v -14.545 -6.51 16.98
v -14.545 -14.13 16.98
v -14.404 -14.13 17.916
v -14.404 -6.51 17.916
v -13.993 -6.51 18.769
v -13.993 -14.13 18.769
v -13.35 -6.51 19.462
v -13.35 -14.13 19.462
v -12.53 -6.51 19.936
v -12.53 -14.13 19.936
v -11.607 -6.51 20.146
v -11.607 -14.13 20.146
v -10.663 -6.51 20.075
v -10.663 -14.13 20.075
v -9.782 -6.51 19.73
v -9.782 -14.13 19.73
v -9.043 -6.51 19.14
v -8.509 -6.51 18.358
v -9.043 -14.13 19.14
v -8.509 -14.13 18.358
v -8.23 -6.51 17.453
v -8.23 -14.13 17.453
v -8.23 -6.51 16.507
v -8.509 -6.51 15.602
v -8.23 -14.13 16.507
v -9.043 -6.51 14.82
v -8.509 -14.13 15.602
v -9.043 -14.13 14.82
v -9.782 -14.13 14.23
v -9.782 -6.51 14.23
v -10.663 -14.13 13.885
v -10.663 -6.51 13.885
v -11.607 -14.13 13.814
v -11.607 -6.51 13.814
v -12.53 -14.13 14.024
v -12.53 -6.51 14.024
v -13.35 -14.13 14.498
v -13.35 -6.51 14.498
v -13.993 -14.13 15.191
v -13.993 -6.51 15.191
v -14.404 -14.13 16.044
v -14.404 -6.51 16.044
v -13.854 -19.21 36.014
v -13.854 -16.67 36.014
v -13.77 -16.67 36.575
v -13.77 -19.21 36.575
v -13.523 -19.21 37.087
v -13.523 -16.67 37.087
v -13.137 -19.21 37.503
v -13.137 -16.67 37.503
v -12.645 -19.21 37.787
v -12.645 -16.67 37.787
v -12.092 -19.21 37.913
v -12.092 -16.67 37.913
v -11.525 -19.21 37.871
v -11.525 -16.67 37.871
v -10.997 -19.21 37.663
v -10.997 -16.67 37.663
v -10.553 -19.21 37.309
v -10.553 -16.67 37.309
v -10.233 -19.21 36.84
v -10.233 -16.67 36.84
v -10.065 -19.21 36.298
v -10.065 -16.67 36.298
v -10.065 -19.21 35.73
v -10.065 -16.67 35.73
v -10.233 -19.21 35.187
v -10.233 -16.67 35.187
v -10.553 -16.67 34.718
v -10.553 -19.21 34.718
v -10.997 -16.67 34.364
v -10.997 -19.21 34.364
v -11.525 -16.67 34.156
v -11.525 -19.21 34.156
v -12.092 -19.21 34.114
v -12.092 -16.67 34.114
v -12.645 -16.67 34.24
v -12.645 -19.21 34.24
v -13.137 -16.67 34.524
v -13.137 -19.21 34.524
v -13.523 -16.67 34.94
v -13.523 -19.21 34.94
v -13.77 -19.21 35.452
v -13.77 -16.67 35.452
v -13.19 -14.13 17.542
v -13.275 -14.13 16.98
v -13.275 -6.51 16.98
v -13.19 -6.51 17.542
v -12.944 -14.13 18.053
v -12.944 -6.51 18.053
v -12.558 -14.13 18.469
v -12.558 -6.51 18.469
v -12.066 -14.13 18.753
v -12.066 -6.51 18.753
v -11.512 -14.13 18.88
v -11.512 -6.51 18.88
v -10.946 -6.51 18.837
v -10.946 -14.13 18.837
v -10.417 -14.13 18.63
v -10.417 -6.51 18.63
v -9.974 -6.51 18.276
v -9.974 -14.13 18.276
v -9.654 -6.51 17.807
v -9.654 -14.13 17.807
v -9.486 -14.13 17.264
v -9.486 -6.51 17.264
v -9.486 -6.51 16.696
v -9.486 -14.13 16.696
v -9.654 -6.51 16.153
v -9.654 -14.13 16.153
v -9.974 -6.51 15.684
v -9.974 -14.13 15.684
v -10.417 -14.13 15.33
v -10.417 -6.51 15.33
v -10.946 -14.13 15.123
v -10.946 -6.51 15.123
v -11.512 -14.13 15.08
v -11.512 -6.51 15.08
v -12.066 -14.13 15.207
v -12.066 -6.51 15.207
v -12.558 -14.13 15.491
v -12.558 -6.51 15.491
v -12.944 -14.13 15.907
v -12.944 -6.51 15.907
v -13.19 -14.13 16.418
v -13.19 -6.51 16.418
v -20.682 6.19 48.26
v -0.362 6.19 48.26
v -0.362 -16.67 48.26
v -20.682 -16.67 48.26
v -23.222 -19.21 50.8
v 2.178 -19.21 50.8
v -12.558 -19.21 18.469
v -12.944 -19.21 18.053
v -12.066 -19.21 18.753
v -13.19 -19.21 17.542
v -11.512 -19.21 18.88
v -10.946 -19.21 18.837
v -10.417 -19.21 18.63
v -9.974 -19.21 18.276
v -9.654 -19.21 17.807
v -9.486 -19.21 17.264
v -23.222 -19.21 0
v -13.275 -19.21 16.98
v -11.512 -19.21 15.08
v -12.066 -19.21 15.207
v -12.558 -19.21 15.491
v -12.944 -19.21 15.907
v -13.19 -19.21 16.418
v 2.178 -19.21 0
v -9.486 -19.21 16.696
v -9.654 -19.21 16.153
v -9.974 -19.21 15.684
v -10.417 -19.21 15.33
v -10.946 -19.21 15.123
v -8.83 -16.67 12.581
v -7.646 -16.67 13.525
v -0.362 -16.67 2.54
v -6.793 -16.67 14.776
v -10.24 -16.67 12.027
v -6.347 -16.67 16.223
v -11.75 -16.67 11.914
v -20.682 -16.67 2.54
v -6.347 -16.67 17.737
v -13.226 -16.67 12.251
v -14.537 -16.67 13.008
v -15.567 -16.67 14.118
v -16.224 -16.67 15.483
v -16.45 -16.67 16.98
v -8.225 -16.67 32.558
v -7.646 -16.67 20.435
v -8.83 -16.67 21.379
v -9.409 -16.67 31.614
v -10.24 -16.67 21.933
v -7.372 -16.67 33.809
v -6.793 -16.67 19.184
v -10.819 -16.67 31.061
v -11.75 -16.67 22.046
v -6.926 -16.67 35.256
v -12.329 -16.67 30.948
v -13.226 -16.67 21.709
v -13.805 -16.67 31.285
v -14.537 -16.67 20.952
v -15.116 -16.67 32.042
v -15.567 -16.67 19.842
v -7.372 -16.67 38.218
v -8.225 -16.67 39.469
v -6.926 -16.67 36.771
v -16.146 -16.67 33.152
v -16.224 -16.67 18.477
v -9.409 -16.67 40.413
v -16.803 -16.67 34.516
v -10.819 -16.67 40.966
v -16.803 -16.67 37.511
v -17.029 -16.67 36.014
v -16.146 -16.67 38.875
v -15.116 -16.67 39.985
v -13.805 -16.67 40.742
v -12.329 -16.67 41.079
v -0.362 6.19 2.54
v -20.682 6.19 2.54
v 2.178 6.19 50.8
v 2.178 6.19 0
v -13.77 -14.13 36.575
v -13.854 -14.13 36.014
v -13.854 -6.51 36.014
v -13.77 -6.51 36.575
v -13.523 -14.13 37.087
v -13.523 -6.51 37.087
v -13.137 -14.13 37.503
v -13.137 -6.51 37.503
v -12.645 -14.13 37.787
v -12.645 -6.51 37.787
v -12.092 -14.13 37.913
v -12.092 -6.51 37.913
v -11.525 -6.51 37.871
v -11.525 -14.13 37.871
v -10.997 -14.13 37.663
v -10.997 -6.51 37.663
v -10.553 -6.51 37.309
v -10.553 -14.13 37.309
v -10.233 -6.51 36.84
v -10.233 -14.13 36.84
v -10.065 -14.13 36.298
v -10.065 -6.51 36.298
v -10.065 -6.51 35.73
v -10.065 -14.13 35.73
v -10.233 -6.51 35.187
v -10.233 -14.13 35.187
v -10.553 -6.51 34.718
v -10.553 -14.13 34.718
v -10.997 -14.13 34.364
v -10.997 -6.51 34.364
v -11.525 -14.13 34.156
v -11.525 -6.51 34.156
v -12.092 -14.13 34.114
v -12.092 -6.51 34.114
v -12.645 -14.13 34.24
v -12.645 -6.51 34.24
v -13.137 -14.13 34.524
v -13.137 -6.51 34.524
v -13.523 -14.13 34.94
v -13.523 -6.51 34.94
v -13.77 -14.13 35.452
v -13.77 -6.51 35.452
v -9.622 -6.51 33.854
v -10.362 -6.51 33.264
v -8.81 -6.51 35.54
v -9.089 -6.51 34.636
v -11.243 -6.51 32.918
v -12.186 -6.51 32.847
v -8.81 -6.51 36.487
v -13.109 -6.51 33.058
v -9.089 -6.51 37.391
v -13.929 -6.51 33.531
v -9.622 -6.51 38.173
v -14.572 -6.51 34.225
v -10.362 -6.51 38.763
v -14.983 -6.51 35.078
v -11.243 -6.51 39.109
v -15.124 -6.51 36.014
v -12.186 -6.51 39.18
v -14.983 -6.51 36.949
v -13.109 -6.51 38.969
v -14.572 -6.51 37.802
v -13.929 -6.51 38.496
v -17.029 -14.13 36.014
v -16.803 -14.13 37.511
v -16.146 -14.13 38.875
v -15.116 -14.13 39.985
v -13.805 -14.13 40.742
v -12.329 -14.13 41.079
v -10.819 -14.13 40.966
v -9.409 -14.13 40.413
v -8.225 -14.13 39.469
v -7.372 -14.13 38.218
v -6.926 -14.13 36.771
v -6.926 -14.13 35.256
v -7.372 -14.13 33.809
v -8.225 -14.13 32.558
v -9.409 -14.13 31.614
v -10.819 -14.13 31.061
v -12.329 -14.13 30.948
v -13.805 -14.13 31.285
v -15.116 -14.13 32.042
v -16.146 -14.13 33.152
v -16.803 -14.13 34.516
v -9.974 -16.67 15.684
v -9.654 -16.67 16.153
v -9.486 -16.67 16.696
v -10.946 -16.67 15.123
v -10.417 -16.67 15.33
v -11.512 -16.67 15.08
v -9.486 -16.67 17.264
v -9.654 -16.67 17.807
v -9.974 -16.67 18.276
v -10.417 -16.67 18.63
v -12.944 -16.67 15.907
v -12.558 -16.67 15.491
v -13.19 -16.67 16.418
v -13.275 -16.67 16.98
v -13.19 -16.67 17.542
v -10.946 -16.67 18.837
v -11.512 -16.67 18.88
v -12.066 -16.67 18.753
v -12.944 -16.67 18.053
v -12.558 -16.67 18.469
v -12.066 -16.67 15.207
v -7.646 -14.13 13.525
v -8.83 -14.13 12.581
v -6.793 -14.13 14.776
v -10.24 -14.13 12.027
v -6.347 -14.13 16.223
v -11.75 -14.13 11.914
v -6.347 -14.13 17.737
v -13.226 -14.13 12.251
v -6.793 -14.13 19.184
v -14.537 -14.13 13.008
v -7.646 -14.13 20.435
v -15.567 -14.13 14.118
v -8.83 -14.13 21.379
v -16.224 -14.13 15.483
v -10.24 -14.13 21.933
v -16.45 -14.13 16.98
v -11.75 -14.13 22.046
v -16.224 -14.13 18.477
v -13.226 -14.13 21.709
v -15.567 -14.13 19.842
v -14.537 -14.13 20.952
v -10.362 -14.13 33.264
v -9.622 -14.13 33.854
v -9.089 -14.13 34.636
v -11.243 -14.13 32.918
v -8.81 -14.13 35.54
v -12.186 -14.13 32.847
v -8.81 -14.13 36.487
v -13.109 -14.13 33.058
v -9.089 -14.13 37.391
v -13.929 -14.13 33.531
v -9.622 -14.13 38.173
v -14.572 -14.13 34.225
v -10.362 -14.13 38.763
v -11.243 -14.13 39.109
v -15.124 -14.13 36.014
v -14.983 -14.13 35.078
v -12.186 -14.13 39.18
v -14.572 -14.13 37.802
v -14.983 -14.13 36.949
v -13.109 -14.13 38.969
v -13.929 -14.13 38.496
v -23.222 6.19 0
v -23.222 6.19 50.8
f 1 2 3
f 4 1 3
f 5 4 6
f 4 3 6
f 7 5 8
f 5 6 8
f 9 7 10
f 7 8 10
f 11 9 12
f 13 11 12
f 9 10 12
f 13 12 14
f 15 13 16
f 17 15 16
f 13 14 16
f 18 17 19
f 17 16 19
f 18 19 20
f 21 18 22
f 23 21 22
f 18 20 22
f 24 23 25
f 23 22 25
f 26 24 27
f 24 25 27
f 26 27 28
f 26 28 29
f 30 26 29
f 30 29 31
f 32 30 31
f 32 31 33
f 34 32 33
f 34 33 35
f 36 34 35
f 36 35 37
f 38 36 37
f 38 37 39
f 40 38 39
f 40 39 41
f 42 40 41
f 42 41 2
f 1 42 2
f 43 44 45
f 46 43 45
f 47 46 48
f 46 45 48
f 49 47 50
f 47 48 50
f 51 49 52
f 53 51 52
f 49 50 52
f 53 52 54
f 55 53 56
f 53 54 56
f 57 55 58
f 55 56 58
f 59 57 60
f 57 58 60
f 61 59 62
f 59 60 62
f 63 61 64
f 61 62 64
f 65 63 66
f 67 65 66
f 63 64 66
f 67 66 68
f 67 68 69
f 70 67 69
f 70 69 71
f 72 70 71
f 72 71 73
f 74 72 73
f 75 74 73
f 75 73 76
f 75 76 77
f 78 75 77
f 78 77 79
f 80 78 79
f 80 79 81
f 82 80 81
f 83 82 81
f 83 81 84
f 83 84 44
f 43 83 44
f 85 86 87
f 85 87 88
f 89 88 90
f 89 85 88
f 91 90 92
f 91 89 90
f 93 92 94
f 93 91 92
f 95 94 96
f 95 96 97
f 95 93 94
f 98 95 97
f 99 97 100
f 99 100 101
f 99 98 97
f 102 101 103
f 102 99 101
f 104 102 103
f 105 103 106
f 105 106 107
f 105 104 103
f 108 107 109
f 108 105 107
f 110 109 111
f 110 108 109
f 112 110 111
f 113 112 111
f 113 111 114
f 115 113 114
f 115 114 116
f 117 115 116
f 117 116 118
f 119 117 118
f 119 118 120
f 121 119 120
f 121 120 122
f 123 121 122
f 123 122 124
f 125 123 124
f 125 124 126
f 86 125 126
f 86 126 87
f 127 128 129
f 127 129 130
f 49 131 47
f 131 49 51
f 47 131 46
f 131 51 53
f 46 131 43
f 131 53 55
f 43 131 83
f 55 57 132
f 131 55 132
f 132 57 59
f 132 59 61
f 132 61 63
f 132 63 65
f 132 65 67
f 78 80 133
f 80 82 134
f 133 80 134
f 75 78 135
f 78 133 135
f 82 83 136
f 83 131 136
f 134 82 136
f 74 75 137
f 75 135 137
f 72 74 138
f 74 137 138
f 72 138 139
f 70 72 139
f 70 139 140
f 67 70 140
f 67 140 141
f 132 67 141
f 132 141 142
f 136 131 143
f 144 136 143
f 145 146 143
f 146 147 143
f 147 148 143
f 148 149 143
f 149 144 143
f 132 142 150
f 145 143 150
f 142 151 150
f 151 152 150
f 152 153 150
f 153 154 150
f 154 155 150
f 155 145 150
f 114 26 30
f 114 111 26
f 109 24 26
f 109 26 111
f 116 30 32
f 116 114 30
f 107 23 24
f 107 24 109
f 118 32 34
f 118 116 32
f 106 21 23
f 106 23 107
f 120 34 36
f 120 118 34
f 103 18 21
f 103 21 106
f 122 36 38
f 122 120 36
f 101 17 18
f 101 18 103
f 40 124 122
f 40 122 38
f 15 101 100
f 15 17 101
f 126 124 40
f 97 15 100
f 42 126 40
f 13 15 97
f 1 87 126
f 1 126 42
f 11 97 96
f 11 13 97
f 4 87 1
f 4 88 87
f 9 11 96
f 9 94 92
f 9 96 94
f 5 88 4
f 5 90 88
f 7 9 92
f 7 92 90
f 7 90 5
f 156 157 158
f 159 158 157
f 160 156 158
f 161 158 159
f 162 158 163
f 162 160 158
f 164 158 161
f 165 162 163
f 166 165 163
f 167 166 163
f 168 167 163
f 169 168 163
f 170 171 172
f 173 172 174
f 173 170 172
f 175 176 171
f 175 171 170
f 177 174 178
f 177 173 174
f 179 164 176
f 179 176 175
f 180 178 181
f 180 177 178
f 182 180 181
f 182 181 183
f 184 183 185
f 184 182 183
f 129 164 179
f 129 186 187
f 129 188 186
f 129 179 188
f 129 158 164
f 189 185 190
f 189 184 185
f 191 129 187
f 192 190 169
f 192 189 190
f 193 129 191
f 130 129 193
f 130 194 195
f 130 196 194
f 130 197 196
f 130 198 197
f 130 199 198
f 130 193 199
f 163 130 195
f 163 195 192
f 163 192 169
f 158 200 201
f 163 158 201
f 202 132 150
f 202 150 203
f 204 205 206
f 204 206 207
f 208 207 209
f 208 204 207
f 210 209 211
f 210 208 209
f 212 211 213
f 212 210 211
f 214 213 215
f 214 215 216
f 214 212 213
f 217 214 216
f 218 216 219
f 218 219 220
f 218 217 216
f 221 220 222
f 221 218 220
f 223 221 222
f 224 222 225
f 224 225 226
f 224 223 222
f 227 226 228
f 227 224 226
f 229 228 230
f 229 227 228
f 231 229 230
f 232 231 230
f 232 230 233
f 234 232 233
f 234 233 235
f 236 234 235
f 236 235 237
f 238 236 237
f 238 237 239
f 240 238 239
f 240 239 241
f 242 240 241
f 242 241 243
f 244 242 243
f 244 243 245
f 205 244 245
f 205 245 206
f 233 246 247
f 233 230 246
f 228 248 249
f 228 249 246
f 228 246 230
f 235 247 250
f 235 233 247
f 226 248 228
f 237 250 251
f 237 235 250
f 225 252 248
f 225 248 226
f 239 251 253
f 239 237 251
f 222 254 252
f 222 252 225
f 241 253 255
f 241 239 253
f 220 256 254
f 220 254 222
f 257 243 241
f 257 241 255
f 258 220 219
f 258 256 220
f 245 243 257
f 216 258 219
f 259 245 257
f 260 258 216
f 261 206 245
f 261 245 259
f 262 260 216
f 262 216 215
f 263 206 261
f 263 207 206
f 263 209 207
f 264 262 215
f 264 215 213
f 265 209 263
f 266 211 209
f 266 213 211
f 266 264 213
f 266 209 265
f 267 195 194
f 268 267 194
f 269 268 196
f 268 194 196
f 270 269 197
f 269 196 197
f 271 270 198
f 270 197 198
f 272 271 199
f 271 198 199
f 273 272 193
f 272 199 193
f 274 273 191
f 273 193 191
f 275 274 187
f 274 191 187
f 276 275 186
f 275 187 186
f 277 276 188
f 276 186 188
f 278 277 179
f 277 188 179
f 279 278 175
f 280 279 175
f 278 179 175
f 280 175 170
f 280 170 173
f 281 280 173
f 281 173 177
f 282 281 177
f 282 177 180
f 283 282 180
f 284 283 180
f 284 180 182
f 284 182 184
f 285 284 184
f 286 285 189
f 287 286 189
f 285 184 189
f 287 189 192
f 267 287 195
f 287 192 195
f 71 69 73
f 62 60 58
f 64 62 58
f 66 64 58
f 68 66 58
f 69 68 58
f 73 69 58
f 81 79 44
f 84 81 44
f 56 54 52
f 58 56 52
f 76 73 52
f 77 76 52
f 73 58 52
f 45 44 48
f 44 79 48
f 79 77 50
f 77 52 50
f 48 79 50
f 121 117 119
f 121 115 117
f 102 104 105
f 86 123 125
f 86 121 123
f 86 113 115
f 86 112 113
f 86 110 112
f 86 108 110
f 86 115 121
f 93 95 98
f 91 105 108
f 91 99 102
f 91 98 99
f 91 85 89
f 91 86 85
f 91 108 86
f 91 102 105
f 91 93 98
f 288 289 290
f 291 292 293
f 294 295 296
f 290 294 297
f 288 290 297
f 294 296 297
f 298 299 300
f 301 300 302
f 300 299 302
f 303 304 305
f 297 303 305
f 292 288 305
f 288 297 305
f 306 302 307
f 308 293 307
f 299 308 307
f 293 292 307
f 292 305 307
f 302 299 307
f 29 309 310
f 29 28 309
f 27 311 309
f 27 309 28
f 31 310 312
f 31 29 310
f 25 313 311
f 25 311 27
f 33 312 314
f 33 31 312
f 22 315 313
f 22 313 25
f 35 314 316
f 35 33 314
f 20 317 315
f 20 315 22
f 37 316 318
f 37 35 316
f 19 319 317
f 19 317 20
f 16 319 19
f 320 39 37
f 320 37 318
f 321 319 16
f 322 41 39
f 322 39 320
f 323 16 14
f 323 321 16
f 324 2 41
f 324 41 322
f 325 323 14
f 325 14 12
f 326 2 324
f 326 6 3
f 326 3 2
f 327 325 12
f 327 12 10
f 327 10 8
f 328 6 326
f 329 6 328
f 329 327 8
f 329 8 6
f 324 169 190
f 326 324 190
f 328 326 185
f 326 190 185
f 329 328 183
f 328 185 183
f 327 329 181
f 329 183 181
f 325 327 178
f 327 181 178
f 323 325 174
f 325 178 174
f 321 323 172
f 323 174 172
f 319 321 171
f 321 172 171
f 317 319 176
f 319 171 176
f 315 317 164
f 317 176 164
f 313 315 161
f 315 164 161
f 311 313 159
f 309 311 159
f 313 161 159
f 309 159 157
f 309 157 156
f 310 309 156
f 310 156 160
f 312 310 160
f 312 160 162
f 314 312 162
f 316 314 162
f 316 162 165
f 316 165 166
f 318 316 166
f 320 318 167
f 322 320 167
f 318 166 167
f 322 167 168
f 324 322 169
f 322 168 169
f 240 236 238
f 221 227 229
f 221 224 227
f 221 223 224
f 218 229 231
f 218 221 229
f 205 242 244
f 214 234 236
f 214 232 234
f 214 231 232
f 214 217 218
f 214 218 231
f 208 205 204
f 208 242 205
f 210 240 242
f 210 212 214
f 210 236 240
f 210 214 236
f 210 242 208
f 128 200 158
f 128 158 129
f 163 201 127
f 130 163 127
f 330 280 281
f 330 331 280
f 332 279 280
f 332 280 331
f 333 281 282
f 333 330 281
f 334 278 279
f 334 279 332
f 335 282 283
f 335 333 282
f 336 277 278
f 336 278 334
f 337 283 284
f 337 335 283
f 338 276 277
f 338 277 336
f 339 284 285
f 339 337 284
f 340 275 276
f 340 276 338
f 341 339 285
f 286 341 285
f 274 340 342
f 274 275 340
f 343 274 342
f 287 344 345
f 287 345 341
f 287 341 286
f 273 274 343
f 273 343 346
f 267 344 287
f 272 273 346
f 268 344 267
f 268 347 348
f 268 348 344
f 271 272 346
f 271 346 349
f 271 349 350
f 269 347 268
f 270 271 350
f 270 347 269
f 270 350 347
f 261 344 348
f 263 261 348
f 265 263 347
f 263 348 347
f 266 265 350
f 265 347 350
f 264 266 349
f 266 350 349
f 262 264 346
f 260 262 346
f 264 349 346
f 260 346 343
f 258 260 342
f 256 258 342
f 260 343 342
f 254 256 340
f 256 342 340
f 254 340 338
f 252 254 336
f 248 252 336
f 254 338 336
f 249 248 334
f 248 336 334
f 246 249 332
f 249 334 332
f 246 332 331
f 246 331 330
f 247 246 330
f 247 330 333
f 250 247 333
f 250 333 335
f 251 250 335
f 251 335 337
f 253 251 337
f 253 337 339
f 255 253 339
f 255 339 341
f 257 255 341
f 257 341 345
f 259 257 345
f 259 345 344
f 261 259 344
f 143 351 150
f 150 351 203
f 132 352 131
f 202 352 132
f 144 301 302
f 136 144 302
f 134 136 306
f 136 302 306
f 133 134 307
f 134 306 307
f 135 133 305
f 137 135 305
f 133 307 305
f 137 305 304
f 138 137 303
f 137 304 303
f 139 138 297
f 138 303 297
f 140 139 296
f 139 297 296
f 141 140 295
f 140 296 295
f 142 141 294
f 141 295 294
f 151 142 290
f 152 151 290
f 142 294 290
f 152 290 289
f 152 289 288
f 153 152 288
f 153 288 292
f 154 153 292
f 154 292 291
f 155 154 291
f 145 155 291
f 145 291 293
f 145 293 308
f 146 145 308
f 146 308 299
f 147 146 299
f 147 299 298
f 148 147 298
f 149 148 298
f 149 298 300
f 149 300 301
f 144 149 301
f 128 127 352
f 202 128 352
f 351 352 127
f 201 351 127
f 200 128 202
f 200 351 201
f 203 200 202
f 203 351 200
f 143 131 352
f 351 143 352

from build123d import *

# Parameters (mm, degrees)
F0_W     = 25.4
F0_H     = 25.4
F1_DEPTH = 50.8
F2_W     = 20.32
F2_H     = 45.72
F3_DEPTH = 22.86
F4_R     = 3.175
F4_R_2   = 1.905
F5_DEPTH = 10.16
F6_DEPTH = 25.4
F7_R     = 5.08
F8_DEPTH = 2.54


with BuildPart() as f1:
    # F0 (on Top) → F1 (new body)
    with BuildSketch(Plane.XY):
        with Locations((-10.5220779449, -6.5101005034)):
            Rectangle(F0_W, F0_H)
    extrude(amount=F1_DEPTH)

    # F2 (on face) → F3 (cut)
    with BuildSketch(Plane(origin=(0, 6.1898994966, 0), x_dir=(-1, 0, 0), z_dir=(0, 1, 0))):
        with Locations((10.5220779449, 25.4)):
            Rectangle(F2_W, F2_H)
    extrude(amount=-F3_DEPTH, mode=Mode.SUBTRACT)

    # F4 (on face) → F5 (join)
    with BuildSketch(Plane(origin=(0, -16.6701005034, 0), x_dir=(-1, 0, 0), z_dir=(0, 1, 0))):
        with Locations((11.9491452351, 36.013584584)):
            Circle(F4_R)
        with Locations((11.9491452351, 36.013584584)):
            Circle(F4_R_2, mode=Mode.SUBTRACT)
        with Locations((11.369979009, 16.9800035655)):
            Circle(F4_R)
        with Locations((11.369979009, 16.9800035655)):
            Circle(F4_R_2, mode=Mode.SUBTRACT)
    extrude(amount=F5_DEPTH)

    # F6 (cut): faces of the model
    f6_faces = [f1.faces().sort_by_distance(p)[0] for p in [
        (-11.9491452351, -16.6701005034, 36.013584584),
        (-11.369979009, -16.6701005034, 16.9800035655),
    ]]
    extrude(f6_faces, amount=-F6_DEPTH, mode=Mode.SUBTRACT)

    # F7 (on face) → F8 (join)
    with BuildSketch(Plane(origin=(0, -16.6701005034, 0), x_dir=(-1, 0, 0), z_dir=(0, 1, 0))):
        with Locations((11.369979009, 16.9800035655)):
            Circle(F7_R)
        with Locations((11.9491452351, 36.013584584)):
            Circle(F7_R)
    extrude(amount=F8_DEPTH)


solid = f1.part
